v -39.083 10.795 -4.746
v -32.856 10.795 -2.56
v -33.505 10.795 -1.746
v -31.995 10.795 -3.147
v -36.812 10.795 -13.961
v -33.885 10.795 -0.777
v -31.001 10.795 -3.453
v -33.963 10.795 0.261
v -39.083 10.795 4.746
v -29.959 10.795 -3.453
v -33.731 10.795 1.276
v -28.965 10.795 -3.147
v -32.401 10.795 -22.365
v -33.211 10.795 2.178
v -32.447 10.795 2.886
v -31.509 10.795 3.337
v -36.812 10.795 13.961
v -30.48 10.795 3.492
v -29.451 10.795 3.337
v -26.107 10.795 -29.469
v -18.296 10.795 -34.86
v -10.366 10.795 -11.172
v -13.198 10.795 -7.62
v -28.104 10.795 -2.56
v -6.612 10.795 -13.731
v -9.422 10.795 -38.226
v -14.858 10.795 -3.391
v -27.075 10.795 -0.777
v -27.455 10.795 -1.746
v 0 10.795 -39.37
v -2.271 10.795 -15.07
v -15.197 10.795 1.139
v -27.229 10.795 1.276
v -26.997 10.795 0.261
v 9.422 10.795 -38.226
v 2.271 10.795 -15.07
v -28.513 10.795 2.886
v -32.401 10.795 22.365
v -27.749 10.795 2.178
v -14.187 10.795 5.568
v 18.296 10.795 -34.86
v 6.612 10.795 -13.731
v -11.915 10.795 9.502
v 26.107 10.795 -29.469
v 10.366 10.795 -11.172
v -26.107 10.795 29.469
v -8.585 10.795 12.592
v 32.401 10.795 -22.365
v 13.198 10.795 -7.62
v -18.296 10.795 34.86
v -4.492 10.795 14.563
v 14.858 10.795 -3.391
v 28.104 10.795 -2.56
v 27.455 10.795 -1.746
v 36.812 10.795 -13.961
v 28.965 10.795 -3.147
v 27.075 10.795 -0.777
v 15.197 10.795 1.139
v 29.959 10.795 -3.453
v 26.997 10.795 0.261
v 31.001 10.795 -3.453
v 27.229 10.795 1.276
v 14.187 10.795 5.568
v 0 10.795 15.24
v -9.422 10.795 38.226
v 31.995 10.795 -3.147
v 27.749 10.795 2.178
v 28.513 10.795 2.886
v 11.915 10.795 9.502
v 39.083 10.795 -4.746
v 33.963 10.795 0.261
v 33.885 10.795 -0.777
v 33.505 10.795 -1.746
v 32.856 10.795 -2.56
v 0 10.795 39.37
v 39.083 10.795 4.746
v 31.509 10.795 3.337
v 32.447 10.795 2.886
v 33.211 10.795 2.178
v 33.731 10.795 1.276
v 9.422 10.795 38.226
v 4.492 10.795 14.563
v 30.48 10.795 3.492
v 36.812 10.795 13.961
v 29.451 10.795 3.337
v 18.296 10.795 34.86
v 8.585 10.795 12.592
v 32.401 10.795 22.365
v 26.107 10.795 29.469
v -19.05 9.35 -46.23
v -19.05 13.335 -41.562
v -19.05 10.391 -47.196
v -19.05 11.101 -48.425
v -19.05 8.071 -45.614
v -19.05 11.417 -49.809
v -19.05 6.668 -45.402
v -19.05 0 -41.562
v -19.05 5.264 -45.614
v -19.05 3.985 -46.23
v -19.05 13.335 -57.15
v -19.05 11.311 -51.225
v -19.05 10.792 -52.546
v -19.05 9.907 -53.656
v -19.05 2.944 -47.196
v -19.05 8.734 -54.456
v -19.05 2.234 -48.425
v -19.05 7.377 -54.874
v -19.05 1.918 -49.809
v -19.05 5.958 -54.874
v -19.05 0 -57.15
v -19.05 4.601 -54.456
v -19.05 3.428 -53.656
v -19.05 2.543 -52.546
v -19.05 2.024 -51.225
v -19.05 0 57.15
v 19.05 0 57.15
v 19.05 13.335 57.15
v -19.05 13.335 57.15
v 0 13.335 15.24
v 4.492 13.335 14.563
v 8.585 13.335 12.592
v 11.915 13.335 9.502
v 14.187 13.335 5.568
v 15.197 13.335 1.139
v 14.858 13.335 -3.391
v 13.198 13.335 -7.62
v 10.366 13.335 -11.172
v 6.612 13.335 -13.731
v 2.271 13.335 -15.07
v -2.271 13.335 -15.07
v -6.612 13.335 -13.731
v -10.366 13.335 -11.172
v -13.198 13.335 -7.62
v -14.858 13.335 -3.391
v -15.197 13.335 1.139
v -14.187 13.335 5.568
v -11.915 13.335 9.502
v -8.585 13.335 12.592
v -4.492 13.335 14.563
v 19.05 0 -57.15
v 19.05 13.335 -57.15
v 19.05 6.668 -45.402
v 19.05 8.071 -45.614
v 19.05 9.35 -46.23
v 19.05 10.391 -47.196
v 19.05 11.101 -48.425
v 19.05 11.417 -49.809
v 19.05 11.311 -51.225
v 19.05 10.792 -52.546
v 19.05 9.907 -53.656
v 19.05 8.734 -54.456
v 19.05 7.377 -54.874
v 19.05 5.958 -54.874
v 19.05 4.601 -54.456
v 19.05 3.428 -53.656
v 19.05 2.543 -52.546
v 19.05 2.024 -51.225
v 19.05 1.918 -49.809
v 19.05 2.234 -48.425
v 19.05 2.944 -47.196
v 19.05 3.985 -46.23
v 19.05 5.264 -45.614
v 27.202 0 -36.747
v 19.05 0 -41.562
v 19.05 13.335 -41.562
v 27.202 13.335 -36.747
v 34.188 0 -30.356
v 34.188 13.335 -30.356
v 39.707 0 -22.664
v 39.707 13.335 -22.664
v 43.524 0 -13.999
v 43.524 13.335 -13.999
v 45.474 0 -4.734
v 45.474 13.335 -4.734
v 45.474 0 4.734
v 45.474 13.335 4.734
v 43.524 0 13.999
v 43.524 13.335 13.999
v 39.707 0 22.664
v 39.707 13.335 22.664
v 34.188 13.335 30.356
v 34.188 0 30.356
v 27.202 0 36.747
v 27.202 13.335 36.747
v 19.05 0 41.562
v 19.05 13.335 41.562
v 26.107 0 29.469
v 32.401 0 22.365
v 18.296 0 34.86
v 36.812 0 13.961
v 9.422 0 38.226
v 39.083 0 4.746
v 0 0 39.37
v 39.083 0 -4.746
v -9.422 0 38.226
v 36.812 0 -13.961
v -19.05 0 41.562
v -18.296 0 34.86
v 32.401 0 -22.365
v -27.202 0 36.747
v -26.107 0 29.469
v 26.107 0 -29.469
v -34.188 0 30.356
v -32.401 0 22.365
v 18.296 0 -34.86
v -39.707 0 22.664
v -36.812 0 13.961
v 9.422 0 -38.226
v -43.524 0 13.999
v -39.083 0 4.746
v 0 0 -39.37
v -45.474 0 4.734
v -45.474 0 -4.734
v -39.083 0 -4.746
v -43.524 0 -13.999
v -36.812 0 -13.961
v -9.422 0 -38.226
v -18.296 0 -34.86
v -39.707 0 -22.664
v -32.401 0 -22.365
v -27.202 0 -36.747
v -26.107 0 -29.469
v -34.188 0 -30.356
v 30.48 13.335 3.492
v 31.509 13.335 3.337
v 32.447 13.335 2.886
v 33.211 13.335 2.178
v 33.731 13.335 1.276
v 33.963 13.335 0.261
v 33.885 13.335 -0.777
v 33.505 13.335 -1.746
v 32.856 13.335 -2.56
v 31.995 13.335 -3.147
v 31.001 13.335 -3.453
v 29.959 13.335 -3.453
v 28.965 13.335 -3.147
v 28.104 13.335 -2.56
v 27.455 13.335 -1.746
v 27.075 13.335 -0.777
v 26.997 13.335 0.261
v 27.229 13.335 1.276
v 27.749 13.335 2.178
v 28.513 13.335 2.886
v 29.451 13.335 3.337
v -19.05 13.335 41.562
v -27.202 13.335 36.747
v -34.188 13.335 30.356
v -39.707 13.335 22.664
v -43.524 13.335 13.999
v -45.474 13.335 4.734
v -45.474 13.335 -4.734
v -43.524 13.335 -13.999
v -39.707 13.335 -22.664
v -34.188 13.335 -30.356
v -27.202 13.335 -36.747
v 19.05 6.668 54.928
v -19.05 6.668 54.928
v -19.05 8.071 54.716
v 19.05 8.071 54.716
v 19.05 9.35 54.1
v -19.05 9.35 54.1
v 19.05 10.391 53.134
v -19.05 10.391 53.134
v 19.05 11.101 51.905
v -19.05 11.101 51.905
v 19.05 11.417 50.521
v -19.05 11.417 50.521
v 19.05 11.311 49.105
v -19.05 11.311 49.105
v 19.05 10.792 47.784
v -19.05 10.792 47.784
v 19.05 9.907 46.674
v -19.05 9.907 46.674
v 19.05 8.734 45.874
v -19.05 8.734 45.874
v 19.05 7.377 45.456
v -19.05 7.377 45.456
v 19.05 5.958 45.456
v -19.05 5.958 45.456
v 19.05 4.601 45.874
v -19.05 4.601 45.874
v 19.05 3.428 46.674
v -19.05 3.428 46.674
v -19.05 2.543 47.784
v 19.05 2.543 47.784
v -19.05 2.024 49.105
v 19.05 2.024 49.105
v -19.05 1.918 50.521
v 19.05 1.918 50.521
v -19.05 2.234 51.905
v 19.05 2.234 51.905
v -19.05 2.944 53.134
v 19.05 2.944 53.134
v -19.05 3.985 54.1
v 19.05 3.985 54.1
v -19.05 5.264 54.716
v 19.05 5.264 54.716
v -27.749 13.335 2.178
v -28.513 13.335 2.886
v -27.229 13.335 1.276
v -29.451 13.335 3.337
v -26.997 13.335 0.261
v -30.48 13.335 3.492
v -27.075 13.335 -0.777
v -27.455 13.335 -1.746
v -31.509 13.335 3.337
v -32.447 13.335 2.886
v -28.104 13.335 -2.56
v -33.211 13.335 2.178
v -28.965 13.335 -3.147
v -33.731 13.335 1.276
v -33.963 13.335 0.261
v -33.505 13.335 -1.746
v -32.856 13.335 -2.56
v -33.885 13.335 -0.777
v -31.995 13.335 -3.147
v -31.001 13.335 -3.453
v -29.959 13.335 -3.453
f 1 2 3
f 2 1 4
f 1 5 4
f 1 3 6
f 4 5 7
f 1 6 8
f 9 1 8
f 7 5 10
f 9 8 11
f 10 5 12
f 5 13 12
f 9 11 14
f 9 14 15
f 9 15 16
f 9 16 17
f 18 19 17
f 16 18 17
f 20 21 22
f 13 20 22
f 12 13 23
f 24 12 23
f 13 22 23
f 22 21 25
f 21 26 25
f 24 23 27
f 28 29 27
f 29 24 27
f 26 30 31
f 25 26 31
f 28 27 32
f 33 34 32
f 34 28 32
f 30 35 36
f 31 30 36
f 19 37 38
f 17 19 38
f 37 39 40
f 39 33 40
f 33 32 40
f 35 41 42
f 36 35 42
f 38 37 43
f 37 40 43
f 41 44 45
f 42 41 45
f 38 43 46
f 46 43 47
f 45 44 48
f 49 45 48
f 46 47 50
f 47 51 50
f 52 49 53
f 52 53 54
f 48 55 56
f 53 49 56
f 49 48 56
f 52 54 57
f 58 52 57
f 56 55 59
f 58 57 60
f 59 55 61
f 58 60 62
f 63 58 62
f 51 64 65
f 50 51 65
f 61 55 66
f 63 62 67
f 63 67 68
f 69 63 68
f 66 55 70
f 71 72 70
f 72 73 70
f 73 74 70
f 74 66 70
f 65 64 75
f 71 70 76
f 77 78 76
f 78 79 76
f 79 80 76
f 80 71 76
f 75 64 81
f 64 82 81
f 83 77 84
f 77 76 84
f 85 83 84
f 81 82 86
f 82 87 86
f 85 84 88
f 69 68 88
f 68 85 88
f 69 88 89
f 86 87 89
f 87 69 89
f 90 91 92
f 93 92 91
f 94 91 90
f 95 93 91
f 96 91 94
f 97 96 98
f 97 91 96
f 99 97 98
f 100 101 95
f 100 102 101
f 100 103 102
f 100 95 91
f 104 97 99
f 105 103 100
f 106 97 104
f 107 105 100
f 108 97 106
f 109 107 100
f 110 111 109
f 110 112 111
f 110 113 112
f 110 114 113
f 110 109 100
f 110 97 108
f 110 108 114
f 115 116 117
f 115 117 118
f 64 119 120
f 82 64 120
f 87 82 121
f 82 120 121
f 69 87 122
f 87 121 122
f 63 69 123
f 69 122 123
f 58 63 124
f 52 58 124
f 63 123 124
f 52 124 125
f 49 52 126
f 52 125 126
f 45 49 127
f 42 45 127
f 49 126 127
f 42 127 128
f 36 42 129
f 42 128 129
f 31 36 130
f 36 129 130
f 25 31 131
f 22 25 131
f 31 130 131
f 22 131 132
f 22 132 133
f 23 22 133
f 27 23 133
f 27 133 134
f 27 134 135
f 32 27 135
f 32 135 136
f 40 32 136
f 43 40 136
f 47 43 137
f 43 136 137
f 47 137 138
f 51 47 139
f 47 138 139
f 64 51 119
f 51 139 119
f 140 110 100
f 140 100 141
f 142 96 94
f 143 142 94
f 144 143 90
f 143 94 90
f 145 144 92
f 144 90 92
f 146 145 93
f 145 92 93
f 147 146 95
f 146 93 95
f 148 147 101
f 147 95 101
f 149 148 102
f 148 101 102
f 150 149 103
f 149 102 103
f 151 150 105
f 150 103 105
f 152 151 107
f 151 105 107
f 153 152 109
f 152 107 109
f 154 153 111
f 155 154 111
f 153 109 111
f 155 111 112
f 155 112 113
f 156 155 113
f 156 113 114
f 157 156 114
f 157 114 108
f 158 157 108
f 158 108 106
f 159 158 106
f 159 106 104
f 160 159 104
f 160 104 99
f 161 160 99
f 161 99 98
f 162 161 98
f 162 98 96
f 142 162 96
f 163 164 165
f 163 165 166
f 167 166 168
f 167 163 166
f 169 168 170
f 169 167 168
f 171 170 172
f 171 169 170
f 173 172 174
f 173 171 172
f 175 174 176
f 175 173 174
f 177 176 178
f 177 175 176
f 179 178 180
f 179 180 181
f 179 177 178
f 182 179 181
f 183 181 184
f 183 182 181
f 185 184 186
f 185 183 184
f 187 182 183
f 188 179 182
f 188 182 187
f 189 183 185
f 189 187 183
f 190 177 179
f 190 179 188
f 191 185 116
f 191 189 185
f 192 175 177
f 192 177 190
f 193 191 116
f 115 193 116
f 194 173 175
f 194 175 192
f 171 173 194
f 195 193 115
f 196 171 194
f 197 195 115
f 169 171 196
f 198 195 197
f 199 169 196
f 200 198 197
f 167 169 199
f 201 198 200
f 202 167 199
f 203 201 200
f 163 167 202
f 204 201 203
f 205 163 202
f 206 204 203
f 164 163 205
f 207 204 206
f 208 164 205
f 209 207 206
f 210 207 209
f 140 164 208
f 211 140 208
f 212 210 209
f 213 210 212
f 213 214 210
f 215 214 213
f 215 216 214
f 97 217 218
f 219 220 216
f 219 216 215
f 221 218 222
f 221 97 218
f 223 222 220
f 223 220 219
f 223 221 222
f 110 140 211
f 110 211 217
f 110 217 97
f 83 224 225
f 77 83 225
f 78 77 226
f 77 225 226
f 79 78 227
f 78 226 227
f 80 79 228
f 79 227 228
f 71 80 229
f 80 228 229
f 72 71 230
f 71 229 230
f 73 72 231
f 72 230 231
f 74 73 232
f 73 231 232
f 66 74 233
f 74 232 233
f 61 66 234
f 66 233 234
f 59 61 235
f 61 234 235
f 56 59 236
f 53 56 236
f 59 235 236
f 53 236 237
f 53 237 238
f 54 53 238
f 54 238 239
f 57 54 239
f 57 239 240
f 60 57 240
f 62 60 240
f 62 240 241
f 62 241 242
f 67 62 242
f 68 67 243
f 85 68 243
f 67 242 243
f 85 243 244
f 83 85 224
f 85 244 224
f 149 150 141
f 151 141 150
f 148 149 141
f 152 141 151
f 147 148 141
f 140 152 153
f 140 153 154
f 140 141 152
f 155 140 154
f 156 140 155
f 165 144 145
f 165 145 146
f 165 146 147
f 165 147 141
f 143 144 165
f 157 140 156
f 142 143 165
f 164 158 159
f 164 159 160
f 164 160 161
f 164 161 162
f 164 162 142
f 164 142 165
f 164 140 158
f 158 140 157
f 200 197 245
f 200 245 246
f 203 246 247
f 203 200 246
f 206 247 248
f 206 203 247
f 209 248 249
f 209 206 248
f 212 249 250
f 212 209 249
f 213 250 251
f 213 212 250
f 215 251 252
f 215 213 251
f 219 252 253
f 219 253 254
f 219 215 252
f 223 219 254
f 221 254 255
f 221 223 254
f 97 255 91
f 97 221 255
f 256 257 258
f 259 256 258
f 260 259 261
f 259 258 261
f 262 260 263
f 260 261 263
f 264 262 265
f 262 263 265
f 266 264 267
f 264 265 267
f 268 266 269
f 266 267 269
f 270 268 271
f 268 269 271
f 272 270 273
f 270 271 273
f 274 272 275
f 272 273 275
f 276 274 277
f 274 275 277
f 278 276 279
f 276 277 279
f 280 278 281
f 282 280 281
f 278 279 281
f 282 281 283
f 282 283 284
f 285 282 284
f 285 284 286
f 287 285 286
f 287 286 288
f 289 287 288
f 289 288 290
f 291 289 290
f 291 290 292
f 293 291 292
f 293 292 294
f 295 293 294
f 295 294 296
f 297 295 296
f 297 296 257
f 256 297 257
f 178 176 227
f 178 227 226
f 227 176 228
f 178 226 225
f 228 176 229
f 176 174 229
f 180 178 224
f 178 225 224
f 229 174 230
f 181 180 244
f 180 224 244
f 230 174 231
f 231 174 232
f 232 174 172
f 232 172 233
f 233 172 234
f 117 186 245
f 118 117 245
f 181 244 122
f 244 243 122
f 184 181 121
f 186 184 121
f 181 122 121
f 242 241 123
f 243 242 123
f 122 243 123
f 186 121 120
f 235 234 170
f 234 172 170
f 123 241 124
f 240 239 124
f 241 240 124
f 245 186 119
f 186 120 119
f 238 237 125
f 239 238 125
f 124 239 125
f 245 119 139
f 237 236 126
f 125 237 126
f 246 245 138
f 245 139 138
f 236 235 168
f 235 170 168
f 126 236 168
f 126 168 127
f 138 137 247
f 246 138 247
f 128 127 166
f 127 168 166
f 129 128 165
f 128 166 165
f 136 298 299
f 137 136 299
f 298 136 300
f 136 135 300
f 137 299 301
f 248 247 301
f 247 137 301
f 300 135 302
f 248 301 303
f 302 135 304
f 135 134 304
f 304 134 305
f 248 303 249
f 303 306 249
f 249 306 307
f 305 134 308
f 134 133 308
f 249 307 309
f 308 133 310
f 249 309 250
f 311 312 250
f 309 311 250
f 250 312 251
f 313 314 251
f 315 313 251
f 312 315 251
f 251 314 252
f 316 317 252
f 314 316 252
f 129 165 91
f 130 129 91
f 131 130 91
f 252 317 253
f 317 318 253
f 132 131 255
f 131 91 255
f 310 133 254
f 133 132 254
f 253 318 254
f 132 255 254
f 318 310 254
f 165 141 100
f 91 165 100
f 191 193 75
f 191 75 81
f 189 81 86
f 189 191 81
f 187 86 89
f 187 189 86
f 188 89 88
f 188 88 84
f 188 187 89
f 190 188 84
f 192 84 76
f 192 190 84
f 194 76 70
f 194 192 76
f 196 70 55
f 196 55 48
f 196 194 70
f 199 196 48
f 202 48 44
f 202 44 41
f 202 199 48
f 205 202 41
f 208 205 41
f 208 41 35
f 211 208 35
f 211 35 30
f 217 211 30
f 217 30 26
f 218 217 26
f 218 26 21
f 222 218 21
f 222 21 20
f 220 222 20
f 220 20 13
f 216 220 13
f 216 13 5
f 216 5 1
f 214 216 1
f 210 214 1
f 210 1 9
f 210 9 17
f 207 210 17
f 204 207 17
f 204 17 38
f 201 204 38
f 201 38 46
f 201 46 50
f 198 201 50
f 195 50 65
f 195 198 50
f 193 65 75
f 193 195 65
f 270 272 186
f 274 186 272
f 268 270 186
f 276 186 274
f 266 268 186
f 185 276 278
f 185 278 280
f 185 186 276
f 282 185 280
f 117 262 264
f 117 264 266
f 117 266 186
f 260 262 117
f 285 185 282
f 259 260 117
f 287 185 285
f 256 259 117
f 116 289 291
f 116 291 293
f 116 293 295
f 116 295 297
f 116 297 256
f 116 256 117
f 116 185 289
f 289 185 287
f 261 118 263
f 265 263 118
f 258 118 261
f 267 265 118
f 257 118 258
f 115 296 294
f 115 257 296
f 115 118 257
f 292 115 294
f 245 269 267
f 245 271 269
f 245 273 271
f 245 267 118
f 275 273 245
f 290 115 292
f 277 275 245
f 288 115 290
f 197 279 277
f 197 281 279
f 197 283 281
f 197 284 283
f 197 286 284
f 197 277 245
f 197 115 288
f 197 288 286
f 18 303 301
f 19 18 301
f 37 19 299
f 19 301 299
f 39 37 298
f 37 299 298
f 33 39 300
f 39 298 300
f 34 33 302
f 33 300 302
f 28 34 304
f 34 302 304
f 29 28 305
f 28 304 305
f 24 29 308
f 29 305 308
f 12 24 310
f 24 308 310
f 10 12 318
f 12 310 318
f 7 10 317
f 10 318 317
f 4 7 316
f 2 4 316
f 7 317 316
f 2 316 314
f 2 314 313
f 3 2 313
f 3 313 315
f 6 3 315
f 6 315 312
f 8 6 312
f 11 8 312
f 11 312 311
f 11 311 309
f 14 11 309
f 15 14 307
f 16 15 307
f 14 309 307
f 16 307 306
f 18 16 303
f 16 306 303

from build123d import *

# Parameters (mm, degrees)
SKETCH1_R           = 39.37
BOSS_EXTRUDE1_DEPTH = 13.335
SKETCH2_R           = 4.7625
CUT_EXTRUDE1_DEPTH  = 88.401931472
BOSS_EXTRUDE2_START = -2.54
SKETCH4_R           = 39.37
BOSS_EXTRUDE2_DEPTH = 2.54
SKETCH5_R           = 3.4925
CUT_EXTRUDE2_DEPTH  = 2.54
SKETCH6_R           = 15.24
CUT_EXTRUDE3_DEPTH  = 2.54


with BuildPart() as part:
    # Sketch1 → Boss-Extrude1 (new body)
    with BuildSketch(Plane(origin=(0, 0, 0), x_dir=(1, 0, 0), z_dir=(0, 1, 0))):
        with BuildLine():
            Line((-19.05, 57.15), (19.05, 57.15))
            Line((19.05, 57.15), (19.05, 41.562193157))
            ThreePointArc((19.05, 41.562193157), (45.72, 0), (19.05, -41.562193157))
            Line((19.05, -41.562193157), (19.05, -57.15))
            Line((19.05, -57.15), (-19.05, -57.15))
            Line((-19.05, -57.15), (-19.05, -41.562193157))
            ThreePointArc((-19.05, -41.562193157), (-45.72, 0), (-19.05, 41.562193157))
            Line((-19.05, 41.562193157), (-19.05, 57.15))
        make_face()
        with Locations(Location((0, 0, 0), (0, 0, 270))):
            Circle(SKETCH1_R, mode=Mode.SUBTRACT)
    extrude(amount=BOSS_EXTRUDE1_DEPTH)

    # Sketch2 → Cut-Extrude1 (cut, through all)
    with BuildSketch(Plane.ZY.offset(19.05)):
        with BuildLine():
            ThreePointArc((45.4025, 6.6675), (50.165, 1.905), (54.9275, 6.6675))
            Line((54.9275, 6.6675), (45.4025, 6.6675))
        make_face()
        with BuildLine():
            Line((45.4025, 6.6675), (54.9275, 6.6675))
            ThreePointArc((54.9275, 6.6675), (50.165, 11.43), (45.4025, 6.6675))
        make_face()
        with Locations((-50.165, 6.6675)):
            Circle(SKETCH2_R)
    extrude(amount=-CUT_EXTRUDE1_DEPTH, mode=Mode.SUBTRACT)

    # Sketch4 → Boss-Extrude2 (add)
    with BuildSketch(Plane(origin=(0, 13.335, 0), x_dir=(1, 0, 0), z_dir=(0, 1, 0)).offset(BOSS_EXTRUDE2_START)):
        with Locations(Location((0, 0, 0), (0, 0, 270))):
            Circle(SKETCH4_R)
    extrude(amount=BOSS_EXTRUDE2_DEPTH)

    # Sketch5 → Cut-Extrude2 (cut)
    with BuildSketch(Plane(origin=(0, 13.335, 0), x_dir=(1, 0, 0), z_dir=(0, 1, 0))):
        with Locations(Location((30.48, 0, 0), (0, 0, 270))):
            Circle(SKETCH5_R)
        with Locations(Location((-30.48, 0, 0), (0, 0, 270))):
            Circle(SKETCH5_R)
    extrude(amount=-CUT_EXTRUDE2_DEPTH, mode=Mode.SUBTRACT)

    # Sketch6 → Cut-Extrude3 (cut)
    with BuildSketch(Plane(origin=(0, 13.335, 0), x_dir=(1, 0, 0), z_dir=(0, 1, 0))):
        with Locations(Location((0, 0, 0), (0, 0, 270))):
            Circle(SKETCH6_R)
    extrude(amount=-CUT_EXTRUDE3_DEPTH, mode=Mode.SUBTRACT)


solid = part.part
